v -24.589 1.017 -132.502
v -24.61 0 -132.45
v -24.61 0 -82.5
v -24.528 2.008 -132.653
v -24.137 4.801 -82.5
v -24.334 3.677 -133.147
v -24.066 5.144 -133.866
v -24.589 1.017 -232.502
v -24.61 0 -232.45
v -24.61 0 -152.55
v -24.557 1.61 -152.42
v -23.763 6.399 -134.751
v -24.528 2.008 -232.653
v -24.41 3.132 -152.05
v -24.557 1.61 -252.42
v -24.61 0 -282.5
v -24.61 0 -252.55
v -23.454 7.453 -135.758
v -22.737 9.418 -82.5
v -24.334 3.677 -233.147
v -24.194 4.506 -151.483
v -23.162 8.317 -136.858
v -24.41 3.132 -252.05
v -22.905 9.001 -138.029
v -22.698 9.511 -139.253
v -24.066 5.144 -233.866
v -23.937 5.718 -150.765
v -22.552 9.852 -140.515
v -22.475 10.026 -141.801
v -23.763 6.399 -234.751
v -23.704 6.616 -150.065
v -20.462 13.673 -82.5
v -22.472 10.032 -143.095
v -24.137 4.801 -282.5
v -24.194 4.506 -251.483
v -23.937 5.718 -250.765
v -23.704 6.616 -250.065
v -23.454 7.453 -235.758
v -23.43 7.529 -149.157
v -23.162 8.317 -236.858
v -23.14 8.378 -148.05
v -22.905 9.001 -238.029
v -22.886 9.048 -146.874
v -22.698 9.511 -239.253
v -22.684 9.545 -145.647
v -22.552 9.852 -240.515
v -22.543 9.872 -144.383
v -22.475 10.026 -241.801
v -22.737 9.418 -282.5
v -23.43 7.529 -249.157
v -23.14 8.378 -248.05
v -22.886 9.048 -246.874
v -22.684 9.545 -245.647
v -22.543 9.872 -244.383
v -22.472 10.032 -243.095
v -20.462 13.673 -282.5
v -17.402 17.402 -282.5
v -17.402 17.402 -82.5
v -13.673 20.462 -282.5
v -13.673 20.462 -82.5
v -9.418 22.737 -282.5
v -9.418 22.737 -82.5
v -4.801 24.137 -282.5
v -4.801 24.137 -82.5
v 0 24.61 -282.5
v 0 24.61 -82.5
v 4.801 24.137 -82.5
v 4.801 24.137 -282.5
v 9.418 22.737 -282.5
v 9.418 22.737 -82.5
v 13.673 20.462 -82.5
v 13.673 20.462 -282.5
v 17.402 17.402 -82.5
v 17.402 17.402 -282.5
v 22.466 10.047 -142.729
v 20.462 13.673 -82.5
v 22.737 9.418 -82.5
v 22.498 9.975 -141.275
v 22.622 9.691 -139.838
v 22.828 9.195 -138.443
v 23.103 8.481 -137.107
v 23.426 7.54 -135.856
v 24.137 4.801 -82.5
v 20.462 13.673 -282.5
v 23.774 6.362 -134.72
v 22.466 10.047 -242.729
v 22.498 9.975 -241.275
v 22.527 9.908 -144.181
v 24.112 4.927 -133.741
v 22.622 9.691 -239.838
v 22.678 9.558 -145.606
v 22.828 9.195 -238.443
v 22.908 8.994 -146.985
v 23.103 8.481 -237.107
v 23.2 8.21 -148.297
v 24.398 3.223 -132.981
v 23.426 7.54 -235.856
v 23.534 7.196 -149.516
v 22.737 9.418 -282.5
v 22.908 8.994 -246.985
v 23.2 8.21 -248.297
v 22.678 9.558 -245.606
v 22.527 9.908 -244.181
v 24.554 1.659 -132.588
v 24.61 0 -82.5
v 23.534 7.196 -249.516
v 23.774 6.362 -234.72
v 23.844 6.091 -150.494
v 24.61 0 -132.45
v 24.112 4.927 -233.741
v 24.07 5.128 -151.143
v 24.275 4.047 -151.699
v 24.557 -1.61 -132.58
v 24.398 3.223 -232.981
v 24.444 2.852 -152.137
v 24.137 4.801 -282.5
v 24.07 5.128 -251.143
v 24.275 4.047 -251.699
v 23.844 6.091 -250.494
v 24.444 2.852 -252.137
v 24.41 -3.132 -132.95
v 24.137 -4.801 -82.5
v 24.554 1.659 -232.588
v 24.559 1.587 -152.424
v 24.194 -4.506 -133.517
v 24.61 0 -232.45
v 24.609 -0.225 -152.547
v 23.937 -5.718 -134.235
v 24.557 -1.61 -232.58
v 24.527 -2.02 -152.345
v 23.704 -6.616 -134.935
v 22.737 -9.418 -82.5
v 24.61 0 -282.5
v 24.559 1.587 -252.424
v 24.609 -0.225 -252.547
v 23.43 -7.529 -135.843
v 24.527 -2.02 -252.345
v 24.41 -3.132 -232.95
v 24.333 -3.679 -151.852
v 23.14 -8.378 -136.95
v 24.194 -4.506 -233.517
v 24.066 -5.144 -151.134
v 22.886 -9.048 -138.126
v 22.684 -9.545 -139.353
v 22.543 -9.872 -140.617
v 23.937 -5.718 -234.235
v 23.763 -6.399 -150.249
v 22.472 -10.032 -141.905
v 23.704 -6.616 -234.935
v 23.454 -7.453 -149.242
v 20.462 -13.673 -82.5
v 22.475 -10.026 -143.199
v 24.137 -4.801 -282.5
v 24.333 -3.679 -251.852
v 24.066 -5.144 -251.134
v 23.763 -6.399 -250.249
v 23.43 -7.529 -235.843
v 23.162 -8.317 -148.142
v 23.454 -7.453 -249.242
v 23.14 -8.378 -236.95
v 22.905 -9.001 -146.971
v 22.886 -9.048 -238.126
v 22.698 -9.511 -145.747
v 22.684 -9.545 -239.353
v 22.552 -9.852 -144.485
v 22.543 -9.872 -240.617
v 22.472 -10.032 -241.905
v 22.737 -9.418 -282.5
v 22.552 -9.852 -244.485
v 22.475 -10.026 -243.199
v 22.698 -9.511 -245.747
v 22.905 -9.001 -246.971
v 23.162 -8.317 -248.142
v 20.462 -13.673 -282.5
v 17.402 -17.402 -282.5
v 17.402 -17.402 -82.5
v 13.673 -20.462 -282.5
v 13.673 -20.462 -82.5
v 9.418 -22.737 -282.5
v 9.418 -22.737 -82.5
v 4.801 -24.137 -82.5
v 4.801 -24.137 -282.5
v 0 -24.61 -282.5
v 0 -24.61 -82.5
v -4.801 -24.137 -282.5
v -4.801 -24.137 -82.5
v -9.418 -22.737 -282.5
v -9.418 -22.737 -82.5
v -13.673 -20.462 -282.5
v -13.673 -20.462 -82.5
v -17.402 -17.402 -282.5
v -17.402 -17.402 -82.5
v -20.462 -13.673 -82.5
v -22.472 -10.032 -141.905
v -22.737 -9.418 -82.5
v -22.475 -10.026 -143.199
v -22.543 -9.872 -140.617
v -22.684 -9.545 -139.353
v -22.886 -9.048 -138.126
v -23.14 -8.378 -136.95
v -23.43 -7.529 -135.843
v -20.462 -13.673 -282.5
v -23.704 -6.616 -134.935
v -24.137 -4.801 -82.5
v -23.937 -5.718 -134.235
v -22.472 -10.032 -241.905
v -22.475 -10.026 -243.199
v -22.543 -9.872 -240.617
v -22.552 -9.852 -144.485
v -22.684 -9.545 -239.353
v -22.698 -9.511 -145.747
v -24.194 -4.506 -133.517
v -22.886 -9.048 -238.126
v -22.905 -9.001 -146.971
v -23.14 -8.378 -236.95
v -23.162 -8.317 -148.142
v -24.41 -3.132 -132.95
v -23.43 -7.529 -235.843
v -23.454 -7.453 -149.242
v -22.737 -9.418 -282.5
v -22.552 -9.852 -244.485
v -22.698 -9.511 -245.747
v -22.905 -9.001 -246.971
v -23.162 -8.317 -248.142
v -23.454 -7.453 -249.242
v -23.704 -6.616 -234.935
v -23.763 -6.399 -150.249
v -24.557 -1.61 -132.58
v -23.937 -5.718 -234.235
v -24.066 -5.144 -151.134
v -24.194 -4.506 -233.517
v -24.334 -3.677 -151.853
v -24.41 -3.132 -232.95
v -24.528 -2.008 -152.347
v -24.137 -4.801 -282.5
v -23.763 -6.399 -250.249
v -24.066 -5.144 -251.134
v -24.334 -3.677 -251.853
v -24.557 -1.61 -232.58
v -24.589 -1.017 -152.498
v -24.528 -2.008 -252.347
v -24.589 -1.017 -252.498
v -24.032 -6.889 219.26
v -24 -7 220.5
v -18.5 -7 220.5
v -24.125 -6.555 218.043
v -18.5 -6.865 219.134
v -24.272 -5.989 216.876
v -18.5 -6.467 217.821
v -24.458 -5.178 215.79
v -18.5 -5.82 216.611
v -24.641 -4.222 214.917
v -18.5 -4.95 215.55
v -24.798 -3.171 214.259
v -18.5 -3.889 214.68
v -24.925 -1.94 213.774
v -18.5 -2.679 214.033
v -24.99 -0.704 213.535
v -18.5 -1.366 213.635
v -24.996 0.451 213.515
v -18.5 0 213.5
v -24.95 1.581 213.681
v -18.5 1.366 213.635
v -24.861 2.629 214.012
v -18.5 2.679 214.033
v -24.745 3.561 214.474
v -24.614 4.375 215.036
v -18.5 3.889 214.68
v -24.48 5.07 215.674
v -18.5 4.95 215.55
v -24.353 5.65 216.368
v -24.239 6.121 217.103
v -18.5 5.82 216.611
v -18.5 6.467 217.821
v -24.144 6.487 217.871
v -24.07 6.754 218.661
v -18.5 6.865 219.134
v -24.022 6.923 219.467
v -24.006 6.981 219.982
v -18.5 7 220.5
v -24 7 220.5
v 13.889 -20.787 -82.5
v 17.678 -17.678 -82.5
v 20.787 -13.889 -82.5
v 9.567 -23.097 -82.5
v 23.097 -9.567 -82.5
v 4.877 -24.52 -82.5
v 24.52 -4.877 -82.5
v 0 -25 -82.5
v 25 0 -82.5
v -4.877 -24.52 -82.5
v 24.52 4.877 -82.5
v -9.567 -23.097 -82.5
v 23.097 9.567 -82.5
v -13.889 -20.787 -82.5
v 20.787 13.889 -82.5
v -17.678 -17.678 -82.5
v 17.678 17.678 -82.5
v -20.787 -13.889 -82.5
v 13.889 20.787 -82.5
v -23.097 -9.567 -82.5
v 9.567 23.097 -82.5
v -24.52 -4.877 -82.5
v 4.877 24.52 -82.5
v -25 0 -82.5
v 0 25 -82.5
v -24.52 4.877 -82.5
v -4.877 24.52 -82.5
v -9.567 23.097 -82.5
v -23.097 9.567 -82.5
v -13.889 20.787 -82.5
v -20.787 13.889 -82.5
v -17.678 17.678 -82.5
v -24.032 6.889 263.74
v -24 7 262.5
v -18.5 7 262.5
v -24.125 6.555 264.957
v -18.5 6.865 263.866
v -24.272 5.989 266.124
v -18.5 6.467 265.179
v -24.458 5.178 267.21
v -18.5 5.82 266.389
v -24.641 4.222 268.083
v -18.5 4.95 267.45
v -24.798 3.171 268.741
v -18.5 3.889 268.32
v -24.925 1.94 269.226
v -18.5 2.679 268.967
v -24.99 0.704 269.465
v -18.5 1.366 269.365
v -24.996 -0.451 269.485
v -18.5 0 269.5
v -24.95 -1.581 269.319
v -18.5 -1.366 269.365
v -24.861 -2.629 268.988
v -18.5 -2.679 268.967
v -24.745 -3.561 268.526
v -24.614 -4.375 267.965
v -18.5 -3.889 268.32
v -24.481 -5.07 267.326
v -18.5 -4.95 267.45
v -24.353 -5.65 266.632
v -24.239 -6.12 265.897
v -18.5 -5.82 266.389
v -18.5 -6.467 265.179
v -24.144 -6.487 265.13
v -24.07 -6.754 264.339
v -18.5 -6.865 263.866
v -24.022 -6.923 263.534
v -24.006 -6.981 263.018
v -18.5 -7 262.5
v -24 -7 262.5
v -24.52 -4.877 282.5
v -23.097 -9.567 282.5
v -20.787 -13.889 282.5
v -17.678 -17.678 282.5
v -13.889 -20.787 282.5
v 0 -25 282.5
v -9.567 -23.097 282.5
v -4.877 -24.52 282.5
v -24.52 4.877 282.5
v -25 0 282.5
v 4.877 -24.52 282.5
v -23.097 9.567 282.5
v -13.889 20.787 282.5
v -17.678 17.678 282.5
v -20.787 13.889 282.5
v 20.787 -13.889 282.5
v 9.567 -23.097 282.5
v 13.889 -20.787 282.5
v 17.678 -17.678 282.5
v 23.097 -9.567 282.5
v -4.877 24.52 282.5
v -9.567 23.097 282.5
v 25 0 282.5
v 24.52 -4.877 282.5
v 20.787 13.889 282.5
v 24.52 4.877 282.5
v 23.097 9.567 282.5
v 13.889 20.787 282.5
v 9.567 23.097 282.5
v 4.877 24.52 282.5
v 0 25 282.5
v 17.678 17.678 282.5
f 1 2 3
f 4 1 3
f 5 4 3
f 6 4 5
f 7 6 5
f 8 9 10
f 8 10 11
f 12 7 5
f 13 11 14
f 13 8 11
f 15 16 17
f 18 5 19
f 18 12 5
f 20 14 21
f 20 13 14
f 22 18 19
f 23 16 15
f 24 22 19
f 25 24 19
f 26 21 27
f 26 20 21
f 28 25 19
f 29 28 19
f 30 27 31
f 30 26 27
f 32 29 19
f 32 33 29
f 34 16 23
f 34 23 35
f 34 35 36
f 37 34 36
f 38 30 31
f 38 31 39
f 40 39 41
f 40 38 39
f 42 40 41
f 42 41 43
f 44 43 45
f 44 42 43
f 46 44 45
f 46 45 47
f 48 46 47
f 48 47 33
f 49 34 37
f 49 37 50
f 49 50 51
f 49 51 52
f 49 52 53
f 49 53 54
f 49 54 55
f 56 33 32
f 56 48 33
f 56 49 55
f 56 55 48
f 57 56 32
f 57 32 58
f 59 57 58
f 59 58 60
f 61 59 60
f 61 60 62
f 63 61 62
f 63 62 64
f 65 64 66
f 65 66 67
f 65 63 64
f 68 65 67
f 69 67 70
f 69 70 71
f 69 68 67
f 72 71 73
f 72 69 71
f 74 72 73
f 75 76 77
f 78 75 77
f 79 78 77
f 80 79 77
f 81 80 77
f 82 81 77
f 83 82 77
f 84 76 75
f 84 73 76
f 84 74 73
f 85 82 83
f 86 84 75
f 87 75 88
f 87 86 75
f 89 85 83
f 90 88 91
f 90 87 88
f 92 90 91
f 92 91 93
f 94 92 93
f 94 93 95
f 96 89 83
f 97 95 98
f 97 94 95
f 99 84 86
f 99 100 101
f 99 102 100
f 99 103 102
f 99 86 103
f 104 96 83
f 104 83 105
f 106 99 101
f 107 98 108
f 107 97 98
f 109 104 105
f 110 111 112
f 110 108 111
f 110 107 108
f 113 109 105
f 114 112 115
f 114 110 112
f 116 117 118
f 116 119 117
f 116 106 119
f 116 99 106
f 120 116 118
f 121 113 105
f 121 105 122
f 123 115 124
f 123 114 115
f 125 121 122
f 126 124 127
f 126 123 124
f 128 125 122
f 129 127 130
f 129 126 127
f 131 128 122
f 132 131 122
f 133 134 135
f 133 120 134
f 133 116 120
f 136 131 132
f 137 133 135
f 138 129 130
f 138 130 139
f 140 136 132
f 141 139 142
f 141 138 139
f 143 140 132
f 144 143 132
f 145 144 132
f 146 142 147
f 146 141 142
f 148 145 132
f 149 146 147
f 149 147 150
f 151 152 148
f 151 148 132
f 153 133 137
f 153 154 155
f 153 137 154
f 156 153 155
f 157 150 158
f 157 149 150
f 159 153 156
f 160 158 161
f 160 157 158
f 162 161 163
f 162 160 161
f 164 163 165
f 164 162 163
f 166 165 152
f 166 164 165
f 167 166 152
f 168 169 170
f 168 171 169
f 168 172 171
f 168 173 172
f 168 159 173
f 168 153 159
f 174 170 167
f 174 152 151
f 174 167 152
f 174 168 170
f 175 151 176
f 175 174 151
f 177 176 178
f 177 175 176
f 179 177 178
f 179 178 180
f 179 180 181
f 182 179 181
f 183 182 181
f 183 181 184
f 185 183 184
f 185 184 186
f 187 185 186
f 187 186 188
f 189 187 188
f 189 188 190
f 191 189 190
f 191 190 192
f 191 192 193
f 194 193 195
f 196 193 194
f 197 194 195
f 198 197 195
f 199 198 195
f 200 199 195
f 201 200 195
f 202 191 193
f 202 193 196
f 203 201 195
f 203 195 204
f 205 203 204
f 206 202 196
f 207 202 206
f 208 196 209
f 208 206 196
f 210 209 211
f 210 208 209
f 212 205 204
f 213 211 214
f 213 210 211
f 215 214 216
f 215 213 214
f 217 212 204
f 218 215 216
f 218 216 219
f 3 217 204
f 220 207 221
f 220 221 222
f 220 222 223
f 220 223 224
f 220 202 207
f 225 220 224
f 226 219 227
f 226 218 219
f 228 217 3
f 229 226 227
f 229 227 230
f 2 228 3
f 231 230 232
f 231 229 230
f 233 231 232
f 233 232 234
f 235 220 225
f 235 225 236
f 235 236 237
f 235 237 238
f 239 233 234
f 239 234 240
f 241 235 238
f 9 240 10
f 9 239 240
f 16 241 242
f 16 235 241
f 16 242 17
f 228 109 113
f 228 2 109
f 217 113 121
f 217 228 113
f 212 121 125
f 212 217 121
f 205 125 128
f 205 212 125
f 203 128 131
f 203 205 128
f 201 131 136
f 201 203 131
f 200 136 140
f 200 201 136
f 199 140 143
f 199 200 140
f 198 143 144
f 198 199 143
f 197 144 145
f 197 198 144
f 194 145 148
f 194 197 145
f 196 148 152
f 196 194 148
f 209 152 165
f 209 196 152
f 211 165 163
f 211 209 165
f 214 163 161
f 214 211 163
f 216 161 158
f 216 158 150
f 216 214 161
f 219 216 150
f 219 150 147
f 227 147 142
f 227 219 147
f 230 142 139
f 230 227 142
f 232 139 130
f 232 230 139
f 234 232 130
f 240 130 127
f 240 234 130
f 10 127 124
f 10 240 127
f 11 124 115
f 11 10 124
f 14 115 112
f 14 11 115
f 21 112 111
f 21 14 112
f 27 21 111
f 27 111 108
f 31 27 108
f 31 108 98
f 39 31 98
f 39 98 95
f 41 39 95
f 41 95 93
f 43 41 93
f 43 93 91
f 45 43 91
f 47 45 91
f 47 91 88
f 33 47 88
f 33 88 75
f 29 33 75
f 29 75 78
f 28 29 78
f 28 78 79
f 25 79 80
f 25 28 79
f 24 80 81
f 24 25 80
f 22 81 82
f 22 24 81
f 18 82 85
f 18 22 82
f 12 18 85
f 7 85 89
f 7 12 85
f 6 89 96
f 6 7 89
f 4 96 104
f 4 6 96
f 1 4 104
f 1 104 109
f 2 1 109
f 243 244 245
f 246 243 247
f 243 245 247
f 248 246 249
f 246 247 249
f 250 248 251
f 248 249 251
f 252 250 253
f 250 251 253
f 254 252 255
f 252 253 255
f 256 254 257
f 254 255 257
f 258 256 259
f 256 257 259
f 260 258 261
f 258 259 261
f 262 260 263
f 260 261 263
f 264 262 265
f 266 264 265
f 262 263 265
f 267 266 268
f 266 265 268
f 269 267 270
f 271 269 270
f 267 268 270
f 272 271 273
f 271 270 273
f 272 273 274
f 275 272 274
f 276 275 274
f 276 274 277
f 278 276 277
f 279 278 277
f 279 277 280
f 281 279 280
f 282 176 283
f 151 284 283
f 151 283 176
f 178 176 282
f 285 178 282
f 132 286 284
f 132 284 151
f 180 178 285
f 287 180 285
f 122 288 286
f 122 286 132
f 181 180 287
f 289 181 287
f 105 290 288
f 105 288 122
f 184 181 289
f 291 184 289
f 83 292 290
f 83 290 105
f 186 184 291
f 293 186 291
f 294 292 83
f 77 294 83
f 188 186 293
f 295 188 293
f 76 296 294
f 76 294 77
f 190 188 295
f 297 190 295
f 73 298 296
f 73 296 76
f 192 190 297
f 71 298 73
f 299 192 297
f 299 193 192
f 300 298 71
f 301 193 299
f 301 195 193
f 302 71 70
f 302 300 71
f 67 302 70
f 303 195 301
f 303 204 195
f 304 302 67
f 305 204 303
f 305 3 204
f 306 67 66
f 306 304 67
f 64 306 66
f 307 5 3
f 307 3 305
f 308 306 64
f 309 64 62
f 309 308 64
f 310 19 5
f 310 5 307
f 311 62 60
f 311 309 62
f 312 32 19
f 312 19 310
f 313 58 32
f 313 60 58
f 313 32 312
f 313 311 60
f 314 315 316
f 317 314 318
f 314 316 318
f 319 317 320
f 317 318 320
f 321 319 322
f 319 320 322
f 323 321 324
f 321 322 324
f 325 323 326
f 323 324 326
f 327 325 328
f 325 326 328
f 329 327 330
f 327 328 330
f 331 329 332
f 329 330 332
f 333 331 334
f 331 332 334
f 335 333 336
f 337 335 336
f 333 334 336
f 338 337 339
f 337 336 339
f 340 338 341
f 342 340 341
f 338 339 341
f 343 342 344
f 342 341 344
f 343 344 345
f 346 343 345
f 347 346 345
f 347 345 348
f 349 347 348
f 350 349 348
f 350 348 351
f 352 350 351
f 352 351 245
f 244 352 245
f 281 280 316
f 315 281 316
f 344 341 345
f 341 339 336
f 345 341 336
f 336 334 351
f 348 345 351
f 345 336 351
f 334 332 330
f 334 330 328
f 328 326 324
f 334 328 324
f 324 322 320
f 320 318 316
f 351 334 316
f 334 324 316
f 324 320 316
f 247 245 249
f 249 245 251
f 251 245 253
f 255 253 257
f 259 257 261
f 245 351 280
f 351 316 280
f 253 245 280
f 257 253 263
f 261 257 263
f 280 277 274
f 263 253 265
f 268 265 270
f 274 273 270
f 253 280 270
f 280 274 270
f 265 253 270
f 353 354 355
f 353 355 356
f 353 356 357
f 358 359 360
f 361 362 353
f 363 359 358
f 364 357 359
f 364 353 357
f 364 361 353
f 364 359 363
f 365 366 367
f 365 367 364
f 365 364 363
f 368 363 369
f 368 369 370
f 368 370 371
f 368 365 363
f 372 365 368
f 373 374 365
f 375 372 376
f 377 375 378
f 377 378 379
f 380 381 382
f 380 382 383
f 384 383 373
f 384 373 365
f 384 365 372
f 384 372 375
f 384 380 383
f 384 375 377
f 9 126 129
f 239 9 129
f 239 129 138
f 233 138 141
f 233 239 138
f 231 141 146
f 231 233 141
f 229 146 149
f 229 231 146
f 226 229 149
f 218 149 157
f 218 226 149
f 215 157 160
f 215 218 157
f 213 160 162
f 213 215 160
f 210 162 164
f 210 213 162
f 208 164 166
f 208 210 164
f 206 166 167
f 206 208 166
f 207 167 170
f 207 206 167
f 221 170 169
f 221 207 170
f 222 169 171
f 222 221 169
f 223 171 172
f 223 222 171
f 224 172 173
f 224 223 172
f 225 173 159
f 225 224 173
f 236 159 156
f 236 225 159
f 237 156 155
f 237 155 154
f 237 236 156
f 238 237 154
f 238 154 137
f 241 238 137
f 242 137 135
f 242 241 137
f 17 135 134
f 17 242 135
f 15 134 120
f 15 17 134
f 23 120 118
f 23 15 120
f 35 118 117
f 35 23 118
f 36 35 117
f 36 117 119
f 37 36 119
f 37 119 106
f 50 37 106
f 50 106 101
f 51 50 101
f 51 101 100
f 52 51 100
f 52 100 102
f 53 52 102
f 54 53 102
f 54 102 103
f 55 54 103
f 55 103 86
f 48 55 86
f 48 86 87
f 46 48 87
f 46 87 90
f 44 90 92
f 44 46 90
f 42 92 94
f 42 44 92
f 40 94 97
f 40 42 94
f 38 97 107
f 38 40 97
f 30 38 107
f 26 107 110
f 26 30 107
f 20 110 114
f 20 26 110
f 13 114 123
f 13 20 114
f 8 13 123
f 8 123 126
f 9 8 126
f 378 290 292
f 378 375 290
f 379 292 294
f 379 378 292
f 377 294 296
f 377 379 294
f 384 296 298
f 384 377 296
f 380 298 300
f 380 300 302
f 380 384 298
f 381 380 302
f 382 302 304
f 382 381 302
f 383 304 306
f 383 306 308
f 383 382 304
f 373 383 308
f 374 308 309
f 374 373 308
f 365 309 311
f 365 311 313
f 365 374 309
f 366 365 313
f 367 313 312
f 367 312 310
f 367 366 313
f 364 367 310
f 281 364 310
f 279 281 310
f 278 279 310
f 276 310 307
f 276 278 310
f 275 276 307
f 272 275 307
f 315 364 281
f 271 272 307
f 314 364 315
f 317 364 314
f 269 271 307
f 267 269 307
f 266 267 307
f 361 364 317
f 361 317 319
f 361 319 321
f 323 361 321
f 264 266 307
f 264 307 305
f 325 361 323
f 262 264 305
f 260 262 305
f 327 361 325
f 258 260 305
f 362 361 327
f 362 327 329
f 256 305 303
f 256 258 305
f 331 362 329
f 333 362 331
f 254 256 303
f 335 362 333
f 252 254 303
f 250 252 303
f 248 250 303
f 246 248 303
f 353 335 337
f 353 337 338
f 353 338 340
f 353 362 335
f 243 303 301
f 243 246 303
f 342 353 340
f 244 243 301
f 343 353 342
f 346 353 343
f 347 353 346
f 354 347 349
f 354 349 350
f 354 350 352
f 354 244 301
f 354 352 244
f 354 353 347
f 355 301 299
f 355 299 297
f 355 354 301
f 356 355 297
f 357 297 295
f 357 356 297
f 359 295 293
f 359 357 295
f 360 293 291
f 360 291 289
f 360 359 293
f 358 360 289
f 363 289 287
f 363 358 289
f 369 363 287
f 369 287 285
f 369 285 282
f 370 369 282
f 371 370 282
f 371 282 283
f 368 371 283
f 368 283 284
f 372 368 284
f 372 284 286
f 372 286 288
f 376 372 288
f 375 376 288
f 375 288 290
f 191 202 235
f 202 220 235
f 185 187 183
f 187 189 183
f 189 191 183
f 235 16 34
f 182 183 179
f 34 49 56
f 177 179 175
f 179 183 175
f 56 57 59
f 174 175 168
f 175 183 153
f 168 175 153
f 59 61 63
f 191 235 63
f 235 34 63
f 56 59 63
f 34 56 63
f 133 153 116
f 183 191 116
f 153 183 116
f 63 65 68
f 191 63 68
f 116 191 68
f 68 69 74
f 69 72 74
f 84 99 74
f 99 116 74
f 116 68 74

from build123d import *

# Parameters (mm, degrees)
SKETCH1_R               = 25
BOSS_EXTRUDE1_DEPTH     = 282.5
CUT_EXTRUDE1_DEPTH      = 285.703793442
CUT_EXTRUDE1_DEPTH_BACK = 285.703793442
SKETCH2_R               = 10.05
CUT_EXTRUDE2_DEPTH      = 10
SKETCH4_OUTSIDE_W       = 165.882
SKETCH4_OUTSIDE_H       = 165.882
SKETCH4_OUTSIDE_R       = 24.61
CUT_EXTRUDE3_DEPTH      = 200


with BuildPart() as part:
    # Sketch1 → Boss-Extrude1 (new, symmetric)
    with BuildSketch(Plane.XY):
        Circle(SKETCH1_R)
    extrude(amount=BOSS_EXTRUDE1_DEPTH, both=True)

    # Sketch2 → Cut-Extrude1 (cut, two sides: drawn at the far end of the back side and taken through both)
    with BuildSketch(Plane(origin=(0, 0, 0), x_dir=(0, 0, -1), z_dir=(1, 0, 0)).offset(-CUT_EXTRUDE1_DEPTH_BACK)):
        with Locations(Location((142.5, 0, 0), (0, 0, 180))):
            Circle(SKETCH2_R)
        with Locations(Location((242.5, 0, 0), (0, 0, 180))):
            Circle(SKETCH2_R)
    extrude(amount=CUT_EXTRUDE1_DEPTH + CUT_EXTRUDE1_DEPTH_BACK, mode=Mode.SUBTRACT)

    # Sketch3 → Cut-Extrude2 (cut)
    with BuildSketch(Plane(origin=(-18.5, 0, 0), x_dir=(0, 0, -1), z_dir=(1, 0, 0))):
        with BuildLine():
            Line((-262.5, -7), (-220.5, -7))
            ThreePointArc((-220.5, -7), (-213.5, 0), (-220.5, 7))
            Line((-220.5, 7), (-262.5, 7))
            ThreePointArc((-262.5, 7), (-269.5, 0), (-262.5, -7))
        make_face()
    extrude(amount=-CUT_EXTRUDE2_DEPTH, mode=Mode.SUBTRACT)

    # Sketch4 outside → Cut-Extrude3 (cut)
    with BuildSketch(Plane(origin=(0, 0, -282.5), x_dir=(-1, 0, 0), z_dir=(0, 0, -1))):
        Rectangle(SKETCH4_OUTSIDE_W, SKETCH4_OUTSIDE_H)
        Circle(SKETCH4_OUTSIDE_R, mode=Mode.SUBTRACT)
    extrude(amount=-CUT_EXTRUDE3_DEPTH, mode=Mode.SUBTRACT)


solid = part.part
